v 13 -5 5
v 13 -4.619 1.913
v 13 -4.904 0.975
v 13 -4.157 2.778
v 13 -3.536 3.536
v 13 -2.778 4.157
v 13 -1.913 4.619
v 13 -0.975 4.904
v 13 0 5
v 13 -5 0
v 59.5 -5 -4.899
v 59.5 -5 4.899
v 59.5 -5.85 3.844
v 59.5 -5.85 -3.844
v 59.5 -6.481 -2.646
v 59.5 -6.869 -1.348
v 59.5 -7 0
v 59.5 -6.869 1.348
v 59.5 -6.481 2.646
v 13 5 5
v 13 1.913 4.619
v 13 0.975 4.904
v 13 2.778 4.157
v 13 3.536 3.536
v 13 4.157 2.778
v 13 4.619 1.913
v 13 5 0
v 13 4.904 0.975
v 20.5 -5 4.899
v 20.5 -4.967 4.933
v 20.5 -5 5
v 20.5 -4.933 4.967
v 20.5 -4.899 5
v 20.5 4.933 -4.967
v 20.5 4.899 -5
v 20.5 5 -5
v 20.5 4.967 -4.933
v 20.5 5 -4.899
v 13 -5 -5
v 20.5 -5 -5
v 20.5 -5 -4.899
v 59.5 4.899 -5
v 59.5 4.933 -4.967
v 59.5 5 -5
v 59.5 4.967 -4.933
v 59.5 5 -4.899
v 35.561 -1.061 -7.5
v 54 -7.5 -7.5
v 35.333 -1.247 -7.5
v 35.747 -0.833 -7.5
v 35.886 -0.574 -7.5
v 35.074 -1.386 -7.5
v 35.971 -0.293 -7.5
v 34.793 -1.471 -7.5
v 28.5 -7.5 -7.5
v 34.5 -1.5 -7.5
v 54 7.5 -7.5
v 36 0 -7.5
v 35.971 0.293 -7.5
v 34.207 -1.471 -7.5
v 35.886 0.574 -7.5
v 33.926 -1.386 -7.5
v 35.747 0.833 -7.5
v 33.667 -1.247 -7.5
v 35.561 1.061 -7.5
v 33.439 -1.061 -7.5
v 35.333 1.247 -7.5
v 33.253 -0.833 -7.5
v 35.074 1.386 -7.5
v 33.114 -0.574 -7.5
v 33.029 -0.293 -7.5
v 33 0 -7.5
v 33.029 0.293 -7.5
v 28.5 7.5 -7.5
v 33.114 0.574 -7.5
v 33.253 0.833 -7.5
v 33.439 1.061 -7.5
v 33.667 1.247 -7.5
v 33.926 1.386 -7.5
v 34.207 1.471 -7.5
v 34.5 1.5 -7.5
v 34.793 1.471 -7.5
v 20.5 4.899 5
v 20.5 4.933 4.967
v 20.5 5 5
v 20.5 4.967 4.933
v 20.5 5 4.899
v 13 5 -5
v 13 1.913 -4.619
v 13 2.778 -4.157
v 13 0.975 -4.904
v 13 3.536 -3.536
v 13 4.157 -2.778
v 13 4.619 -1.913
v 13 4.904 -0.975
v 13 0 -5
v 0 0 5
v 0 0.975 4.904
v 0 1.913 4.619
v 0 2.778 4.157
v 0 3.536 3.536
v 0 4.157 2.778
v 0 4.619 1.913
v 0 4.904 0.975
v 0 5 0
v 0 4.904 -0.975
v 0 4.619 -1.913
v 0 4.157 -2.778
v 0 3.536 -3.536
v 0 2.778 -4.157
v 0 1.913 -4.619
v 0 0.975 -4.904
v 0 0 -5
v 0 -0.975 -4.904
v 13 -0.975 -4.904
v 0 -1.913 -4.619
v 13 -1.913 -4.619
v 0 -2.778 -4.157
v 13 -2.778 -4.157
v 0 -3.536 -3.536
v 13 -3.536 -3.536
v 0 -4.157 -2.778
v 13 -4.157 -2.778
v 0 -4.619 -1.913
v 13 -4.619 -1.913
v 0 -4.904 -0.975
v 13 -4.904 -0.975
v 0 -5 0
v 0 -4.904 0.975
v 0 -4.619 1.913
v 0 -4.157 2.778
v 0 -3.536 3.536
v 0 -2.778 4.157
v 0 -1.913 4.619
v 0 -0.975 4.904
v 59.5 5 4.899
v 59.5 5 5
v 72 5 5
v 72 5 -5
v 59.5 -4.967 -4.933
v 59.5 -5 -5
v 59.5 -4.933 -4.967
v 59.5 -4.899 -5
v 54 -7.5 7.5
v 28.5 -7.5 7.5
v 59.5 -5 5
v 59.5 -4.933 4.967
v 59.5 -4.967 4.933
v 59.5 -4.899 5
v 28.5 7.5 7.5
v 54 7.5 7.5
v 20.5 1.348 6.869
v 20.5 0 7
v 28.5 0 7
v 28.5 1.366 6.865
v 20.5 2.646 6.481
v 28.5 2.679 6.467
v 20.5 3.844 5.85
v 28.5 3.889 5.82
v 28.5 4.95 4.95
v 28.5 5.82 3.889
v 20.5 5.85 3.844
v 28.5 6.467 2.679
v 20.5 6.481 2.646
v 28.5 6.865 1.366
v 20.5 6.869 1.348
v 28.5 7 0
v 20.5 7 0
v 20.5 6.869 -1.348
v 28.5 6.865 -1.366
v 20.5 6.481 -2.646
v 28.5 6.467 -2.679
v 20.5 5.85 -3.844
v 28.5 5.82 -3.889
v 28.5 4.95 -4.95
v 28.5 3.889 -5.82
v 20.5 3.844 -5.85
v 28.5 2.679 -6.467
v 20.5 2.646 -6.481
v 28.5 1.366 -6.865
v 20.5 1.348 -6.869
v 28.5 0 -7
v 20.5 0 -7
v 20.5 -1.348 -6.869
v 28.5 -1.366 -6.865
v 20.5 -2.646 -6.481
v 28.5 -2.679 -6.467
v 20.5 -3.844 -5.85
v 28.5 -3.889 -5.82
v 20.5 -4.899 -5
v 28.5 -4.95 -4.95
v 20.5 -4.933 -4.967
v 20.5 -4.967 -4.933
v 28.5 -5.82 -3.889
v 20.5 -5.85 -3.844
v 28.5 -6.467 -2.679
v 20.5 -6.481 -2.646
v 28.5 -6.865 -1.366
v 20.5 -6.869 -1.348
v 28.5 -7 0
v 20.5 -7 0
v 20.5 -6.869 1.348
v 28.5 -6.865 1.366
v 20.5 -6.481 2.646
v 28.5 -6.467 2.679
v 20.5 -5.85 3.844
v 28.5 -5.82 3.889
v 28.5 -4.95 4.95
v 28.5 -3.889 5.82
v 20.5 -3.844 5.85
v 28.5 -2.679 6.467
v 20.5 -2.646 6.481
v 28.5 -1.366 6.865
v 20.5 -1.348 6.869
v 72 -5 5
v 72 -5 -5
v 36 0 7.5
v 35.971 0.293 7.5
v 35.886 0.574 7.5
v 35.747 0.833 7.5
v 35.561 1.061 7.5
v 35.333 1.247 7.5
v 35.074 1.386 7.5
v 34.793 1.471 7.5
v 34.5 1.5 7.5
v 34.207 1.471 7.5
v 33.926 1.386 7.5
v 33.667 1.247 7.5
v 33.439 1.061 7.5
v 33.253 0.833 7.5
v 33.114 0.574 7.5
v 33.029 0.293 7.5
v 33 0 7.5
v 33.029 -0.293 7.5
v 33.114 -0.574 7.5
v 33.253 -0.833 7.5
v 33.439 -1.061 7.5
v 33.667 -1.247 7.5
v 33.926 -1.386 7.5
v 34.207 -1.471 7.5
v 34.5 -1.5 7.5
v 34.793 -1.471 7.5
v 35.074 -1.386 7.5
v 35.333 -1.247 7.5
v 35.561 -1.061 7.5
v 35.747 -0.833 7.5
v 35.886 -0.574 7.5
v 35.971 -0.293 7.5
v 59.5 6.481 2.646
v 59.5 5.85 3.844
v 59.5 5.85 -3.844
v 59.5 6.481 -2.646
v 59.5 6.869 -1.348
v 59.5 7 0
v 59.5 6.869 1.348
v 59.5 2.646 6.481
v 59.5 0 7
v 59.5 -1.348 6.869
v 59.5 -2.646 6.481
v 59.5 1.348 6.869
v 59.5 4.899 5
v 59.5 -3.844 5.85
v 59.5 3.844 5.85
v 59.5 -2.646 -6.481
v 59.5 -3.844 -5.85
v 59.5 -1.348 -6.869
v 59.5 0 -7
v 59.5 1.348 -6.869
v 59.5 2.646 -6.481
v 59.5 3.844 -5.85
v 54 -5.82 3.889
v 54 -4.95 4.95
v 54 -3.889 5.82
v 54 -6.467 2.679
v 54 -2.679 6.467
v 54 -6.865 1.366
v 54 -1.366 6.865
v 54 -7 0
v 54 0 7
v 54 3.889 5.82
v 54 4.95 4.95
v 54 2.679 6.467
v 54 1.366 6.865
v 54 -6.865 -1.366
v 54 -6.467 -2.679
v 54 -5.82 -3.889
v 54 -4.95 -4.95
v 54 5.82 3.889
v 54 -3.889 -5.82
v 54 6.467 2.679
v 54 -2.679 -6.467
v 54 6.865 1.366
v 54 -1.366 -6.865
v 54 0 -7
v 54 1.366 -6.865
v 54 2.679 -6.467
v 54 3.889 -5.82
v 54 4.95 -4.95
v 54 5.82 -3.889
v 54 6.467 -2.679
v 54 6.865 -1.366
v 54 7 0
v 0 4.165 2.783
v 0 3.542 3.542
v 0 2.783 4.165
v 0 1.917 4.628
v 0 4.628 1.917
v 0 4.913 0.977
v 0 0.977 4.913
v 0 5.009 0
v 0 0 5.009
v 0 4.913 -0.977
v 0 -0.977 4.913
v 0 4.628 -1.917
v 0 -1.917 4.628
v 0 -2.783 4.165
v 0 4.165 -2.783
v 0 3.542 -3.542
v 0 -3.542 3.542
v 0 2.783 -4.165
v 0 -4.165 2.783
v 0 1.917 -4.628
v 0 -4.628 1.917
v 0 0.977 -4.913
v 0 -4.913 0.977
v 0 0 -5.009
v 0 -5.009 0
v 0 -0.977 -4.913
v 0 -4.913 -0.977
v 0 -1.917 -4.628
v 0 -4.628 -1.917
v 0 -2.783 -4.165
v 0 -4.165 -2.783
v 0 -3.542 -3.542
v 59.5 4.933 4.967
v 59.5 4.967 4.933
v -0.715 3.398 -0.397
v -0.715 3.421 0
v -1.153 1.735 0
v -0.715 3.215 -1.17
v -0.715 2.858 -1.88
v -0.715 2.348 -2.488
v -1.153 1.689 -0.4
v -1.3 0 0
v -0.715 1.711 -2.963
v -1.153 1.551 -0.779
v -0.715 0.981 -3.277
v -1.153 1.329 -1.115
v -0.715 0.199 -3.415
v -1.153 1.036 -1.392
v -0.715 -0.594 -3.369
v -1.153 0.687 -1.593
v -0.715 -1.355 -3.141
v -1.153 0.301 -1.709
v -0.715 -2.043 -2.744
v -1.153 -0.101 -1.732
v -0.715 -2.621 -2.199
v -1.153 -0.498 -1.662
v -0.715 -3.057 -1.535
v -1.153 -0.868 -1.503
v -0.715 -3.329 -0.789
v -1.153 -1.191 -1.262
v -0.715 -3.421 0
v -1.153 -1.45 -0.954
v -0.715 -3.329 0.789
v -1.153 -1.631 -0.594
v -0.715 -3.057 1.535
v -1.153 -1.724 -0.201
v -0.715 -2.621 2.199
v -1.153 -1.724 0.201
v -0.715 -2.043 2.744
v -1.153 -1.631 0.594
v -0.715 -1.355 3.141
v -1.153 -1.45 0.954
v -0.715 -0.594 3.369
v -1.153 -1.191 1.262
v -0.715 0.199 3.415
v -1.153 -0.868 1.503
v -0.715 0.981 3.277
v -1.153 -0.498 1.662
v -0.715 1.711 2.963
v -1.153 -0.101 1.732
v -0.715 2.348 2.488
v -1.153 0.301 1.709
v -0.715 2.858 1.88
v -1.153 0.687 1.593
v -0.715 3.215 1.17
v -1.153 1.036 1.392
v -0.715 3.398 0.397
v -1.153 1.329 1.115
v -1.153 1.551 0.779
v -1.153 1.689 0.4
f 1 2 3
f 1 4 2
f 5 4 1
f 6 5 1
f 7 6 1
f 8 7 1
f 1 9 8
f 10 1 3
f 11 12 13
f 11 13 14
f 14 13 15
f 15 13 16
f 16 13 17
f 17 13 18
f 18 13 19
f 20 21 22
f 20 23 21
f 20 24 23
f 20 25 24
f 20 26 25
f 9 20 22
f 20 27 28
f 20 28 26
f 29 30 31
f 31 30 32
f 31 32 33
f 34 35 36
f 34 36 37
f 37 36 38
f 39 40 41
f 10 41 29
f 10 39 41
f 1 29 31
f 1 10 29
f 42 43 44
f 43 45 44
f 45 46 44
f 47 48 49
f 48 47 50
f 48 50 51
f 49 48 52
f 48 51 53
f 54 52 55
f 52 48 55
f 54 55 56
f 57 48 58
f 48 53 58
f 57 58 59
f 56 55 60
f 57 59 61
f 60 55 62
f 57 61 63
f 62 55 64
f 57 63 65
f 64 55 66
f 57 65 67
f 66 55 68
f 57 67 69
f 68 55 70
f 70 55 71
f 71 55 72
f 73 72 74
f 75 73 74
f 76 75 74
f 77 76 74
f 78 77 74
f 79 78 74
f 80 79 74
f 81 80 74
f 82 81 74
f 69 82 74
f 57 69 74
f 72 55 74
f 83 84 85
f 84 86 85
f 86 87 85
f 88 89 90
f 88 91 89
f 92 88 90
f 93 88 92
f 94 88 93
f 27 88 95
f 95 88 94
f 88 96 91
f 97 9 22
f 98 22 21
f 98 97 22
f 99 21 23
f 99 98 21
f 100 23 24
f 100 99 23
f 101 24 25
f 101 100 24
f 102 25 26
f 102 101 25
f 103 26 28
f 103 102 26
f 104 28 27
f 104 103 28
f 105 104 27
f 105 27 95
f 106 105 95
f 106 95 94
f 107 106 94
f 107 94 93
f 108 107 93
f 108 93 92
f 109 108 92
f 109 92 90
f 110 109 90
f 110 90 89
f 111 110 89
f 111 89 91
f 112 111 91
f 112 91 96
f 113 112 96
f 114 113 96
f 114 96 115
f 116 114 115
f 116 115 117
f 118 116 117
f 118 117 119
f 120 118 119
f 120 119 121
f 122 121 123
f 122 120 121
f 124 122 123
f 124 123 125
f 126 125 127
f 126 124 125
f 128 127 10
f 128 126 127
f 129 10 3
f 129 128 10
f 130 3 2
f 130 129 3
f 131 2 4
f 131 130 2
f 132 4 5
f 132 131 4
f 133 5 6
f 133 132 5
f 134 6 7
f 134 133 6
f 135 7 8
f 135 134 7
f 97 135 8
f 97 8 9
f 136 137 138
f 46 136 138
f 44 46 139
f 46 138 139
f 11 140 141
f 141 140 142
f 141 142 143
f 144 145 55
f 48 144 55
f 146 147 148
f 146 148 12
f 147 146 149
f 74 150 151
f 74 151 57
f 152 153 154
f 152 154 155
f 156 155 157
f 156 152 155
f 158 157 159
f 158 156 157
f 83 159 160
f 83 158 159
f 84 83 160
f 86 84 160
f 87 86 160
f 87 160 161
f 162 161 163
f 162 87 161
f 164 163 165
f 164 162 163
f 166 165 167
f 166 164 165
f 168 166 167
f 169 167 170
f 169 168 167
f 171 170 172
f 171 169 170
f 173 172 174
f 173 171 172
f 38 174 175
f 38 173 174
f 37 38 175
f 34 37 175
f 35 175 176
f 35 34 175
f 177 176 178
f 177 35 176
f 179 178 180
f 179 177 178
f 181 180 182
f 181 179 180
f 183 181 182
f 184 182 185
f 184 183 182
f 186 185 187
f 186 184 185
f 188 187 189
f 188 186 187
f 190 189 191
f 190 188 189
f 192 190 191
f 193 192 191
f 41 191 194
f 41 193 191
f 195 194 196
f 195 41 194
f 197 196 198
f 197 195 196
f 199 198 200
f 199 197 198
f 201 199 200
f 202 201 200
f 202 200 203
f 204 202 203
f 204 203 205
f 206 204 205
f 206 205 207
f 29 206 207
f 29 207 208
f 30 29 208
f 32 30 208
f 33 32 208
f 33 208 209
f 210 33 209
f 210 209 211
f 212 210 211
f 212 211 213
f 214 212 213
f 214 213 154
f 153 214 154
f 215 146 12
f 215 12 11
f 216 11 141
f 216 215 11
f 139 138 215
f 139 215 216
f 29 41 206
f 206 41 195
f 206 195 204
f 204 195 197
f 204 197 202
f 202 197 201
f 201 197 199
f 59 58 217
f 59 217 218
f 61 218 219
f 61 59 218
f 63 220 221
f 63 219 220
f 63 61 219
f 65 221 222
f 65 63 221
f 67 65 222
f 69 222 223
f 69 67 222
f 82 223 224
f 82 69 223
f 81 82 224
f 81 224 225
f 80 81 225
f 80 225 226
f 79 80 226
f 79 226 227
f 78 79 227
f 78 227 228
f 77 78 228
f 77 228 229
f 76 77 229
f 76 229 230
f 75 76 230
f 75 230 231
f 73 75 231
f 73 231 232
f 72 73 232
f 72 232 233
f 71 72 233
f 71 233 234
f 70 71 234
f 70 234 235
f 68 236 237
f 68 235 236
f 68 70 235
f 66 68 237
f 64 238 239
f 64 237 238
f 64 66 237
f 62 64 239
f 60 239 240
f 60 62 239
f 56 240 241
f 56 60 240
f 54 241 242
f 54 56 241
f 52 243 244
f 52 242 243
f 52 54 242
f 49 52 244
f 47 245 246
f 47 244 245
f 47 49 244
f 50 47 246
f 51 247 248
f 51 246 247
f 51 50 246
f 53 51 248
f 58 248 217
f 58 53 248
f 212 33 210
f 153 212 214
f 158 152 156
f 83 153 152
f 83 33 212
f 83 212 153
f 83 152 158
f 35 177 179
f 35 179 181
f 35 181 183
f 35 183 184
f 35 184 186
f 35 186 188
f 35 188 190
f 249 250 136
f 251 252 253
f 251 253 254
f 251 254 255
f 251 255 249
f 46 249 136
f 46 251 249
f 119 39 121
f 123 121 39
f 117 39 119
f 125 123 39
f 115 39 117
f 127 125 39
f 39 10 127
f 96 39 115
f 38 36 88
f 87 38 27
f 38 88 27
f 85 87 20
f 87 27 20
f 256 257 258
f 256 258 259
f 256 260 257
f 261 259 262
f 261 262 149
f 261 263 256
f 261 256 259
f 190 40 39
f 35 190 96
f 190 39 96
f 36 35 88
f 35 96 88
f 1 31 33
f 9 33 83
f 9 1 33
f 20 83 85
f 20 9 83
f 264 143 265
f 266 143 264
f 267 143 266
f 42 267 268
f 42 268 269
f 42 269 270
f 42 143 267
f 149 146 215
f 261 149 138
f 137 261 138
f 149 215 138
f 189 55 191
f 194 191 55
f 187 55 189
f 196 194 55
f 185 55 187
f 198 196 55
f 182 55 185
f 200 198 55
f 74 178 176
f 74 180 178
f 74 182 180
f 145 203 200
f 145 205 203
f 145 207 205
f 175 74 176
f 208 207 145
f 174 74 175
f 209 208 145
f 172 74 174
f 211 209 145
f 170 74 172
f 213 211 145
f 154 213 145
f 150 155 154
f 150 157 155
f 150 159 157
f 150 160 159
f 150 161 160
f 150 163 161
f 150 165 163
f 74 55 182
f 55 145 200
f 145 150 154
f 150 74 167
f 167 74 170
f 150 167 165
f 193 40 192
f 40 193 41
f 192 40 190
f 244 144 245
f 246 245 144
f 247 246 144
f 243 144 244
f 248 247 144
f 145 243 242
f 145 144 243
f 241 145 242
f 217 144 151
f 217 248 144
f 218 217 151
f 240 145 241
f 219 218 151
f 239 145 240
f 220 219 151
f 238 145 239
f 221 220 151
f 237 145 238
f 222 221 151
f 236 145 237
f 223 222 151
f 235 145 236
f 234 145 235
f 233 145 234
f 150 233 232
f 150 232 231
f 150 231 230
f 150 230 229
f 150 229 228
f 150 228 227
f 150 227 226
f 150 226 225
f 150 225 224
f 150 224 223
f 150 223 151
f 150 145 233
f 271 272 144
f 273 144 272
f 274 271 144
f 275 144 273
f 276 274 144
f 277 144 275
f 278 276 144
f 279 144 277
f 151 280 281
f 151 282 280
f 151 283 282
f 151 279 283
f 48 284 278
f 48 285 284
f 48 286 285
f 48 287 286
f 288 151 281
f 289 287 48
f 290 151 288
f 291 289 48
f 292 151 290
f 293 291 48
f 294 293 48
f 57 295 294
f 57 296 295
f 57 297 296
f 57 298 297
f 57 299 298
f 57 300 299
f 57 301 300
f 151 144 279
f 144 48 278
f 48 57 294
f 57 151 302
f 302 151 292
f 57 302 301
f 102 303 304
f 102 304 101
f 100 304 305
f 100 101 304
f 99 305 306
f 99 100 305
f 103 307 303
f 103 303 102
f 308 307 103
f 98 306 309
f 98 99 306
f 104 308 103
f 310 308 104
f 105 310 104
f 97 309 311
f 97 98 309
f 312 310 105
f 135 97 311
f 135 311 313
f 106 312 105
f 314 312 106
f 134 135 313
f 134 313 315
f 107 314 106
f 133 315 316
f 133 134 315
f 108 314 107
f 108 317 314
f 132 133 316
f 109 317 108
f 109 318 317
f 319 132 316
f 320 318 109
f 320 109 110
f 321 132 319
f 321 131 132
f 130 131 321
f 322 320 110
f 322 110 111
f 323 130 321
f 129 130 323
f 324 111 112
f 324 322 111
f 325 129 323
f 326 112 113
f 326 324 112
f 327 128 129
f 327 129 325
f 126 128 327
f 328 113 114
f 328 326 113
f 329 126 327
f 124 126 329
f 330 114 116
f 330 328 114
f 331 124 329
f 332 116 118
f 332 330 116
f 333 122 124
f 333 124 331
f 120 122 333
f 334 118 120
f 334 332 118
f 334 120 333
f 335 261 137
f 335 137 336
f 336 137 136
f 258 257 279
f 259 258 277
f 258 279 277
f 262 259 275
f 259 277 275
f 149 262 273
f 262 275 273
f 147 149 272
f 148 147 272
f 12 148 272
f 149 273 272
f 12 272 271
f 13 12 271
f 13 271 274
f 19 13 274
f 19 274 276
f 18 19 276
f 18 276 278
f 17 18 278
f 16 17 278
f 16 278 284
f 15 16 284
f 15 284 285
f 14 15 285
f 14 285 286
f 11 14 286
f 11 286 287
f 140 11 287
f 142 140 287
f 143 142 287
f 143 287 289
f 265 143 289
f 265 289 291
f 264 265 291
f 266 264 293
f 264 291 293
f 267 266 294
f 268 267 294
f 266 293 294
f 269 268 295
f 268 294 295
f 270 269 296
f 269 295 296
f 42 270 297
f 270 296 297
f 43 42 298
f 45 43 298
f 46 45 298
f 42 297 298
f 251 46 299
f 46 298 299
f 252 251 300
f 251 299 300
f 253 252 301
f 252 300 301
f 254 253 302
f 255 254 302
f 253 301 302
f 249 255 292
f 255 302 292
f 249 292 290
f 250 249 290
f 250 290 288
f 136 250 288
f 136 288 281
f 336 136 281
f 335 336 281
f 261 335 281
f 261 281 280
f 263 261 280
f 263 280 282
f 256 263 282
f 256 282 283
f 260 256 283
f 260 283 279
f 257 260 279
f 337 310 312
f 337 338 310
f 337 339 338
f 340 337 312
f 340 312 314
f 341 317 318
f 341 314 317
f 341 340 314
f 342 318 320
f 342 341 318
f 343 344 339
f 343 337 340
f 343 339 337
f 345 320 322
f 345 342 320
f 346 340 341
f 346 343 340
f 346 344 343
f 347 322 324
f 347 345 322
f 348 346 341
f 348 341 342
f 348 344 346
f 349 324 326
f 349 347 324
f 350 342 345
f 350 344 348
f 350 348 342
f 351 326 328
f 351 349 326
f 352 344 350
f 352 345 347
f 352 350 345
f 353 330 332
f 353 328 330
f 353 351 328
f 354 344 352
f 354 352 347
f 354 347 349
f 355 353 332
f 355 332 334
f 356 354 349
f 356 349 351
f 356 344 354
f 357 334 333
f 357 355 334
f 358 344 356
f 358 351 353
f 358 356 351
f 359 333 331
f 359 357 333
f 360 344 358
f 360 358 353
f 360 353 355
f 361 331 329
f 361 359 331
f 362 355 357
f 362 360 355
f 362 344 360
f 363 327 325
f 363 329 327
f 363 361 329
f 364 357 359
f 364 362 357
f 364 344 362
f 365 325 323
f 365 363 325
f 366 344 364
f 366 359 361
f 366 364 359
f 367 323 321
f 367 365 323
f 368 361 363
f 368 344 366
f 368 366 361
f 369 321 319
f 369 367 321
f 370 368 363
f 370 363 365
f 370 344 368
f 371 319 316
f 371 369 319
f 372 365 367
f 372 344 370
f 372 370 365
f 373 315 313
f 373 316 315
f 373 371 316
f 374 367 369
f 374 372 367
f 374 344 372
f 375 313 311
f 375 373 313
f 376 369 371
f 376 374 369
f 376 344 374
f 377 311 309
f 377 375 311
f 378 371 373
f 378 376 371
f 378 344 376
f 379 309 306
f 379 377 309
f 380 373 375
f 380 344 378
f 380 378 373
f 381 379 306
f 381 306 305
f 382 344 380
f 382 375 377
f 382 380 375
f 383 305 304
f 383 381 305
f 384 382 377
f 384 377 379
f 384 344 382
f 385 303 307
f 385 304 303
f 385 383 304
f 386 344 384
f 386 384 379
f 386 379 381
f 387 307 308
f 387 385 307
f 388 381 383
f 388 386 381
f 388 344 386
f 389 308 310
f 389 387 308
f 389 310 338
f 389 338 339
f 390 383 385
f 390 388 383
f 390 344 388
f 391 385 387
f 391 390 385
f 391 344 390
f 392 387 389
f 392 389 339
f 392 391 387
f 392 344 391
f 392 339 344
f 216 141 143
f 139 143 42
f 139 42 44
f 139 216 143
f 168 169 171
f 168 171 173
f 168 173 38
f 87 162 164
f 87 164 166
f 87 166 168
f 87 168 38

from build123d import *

# Parameters (mm, degrees)
SCHIZZO1_W                    = 15
SCHIZZO1_H                    = 15
ESTRUSIONE_ESTRUSIONE1_DEPTH  = 72
SCHIZZO2_W                    = 15
SCHIZZO2_H                    = 15
SCHIZZO2_R                    = 5
TAGLIO_ESTRUSIONE1_DEPTH      = 13
SCHIZZO3_W                    = 15
SCHIZZO3_H                    = 15
SCHIZZO3_W_2                  = 10
SCHIZZO3_H_2                  = 10
TAGLIO_ESTRUSIONE2_DEPTH      = 7.5
SCHIZZO4_W                    = 15
SCHIZZO4_H                    = 15
SCHIZZO4_R                    = 7
TAGLIO_ESTRUSIONE3_DEPTH      = 8
SCHIZZO6_W                    = 15
SCHIZZO6_H                    = 15
SCHIZZO6_W_2                  = 10
SCHIZZO6_H_2                  = 10
TAGLIO_ESTRUSIONE4_DEPTH      = 12.5
TAGLIO_ESTRUSIONE5_START      = -5.5
SCHIZZO8_W                    = 15
SCHIZZO8_H                    = 15
SCHIZZO8_R                    = 7
TAGLIO_ESTRUSIONE5_DEPTH      = 5.5
TAGLIO_ESTRUSIONE6_DEPTH      = 73.777056824
TAGLIO_ESTRUSIONE6_DEPTH_BACK = 73.777056824
SCHIZZO9_R                    = 1.5


with BuildPart() as part:
    # Schizzo1 → Estrusione-Estrusione1 (new body)
    with BuildSketch(Plane(origin=(0, 0, 0), x_dir=(0, 0, -1), z_dir=(1, 0, 0))):
        Rectangle(SCHIZZO1_W, SCHIZZO1_H)
    extrude(amount=ESTRUSIONE_ESTRUSIONE1_DEPTH)

    # Schizzo2 → Taglio-Estrusione1 (cut)
    with BuildSketch(Plane.ZY):
        Rectangle(SCHIZZO2_W, SCHIZZO2_H)
        Circle(SCHIZZO2_R, mode=Mode.SUBTRACT)
    extrude(amount=-TAGLIO_ESTRUSIONE1_DEPTH, mode=Mode.SUBTRACT)

    # Schizzo3 → Taglio-Estrusione2 (cut)
    with BuildSketch(Plane.ZY.offset(-13)):
        Rectangle(SCHIZZO3_W, SCHIZZO3_H)
        Rectangle(SCHIZZO3_W_2, SCHIZZO3_H_2, mode=Mode.SUBTRACT)
    extrude(amount=-TAGLIO_ESTRUSIONE2_DEPTH, mode=Mode.SUBTRACT)

    # Schizzo4 → Taglio-Estrusione3 (cut)
    with BuildSketch(Plane.ZY.offset(-20.5)):
        Rectangle(SCHIZZO4_W, SCHIZZO4_H)
        Circle(SCHIZZO4_R, mode=Mode.SUBTRACT)
    extrude(amount=-TAGLIO_ESTRUSIONE3_DEPTH, mode=Mode.SUBTRACT)

    # Schizzo5 → Rivoluzione1 (revolve)
    with BuildSketch(Plane.XY):
        with BuildLine():
            Line((0, 0), (0, 5.008991915))
            ThreePointArc((0, 5.008991915), (-0.969704108, 2.587469807), (-1.3, 0))
            Line((-1.3, 0), (0, 0))
        make_face()
    revolve(axis=Axis((0, 0, 0), (-1, 0, 0)))

    # Schizzo6 → Taglio-Estrusione4 (cut)
    with BuildSketch(Plane(origin=(72, 0, 0), x_dir=(0, 0, -1), z_dir=(1, 0, 0))):
        Rectangle(SCHIZZO6_W, SCHIZZO6_H)
        Rectangle(SCHIZZO6_W_2, SCHIZZO6_H_2, mode=Mode.SUBTRACT)
    extrude(amount=-TAGLIO_ESTRUSIONE4_DEPTH, mode=Mode.SUBTRACT)

    # Schizzo8 → Taglio-Estrusione5 (cut)
    with BuildSketch(Plane(origin=(59.5, 0, 0), x_dir=(0, 0, -1), z_dir=(1, 0, 0)).offset(TAGLIO_ESTRUSIONE5_START)):
        Rectangle(SCHIZZO8_W, SCHIZZO8_H)
        Circle(SCHIZZO8_R, mode=Mode.SUBTRACT)
    extrude(amount=TAGLIO_ESTRUSIONE5_DEPTH, mode=Mode.SUBTRACT)

    # Schizzo9 → Taglio-Estrusione6 (cut, two sides: drawn at the far end of the back side and taken through both)
    with BuildSketch(Plane.XY.offset(-TAGLIO_ESTRUSIONE6_DEPTH_BACK)):
        with Locations((34.5, 0)):
            Circle(SCHIZZO9_R)
    extrude(amount=TAGLIO_ESTRUSIONE6_DEPTH + TAGLIO_ESTRUSIONE6_DEPTH_BACK, mode=Mode.SUBTRACT)


solid = part.part
